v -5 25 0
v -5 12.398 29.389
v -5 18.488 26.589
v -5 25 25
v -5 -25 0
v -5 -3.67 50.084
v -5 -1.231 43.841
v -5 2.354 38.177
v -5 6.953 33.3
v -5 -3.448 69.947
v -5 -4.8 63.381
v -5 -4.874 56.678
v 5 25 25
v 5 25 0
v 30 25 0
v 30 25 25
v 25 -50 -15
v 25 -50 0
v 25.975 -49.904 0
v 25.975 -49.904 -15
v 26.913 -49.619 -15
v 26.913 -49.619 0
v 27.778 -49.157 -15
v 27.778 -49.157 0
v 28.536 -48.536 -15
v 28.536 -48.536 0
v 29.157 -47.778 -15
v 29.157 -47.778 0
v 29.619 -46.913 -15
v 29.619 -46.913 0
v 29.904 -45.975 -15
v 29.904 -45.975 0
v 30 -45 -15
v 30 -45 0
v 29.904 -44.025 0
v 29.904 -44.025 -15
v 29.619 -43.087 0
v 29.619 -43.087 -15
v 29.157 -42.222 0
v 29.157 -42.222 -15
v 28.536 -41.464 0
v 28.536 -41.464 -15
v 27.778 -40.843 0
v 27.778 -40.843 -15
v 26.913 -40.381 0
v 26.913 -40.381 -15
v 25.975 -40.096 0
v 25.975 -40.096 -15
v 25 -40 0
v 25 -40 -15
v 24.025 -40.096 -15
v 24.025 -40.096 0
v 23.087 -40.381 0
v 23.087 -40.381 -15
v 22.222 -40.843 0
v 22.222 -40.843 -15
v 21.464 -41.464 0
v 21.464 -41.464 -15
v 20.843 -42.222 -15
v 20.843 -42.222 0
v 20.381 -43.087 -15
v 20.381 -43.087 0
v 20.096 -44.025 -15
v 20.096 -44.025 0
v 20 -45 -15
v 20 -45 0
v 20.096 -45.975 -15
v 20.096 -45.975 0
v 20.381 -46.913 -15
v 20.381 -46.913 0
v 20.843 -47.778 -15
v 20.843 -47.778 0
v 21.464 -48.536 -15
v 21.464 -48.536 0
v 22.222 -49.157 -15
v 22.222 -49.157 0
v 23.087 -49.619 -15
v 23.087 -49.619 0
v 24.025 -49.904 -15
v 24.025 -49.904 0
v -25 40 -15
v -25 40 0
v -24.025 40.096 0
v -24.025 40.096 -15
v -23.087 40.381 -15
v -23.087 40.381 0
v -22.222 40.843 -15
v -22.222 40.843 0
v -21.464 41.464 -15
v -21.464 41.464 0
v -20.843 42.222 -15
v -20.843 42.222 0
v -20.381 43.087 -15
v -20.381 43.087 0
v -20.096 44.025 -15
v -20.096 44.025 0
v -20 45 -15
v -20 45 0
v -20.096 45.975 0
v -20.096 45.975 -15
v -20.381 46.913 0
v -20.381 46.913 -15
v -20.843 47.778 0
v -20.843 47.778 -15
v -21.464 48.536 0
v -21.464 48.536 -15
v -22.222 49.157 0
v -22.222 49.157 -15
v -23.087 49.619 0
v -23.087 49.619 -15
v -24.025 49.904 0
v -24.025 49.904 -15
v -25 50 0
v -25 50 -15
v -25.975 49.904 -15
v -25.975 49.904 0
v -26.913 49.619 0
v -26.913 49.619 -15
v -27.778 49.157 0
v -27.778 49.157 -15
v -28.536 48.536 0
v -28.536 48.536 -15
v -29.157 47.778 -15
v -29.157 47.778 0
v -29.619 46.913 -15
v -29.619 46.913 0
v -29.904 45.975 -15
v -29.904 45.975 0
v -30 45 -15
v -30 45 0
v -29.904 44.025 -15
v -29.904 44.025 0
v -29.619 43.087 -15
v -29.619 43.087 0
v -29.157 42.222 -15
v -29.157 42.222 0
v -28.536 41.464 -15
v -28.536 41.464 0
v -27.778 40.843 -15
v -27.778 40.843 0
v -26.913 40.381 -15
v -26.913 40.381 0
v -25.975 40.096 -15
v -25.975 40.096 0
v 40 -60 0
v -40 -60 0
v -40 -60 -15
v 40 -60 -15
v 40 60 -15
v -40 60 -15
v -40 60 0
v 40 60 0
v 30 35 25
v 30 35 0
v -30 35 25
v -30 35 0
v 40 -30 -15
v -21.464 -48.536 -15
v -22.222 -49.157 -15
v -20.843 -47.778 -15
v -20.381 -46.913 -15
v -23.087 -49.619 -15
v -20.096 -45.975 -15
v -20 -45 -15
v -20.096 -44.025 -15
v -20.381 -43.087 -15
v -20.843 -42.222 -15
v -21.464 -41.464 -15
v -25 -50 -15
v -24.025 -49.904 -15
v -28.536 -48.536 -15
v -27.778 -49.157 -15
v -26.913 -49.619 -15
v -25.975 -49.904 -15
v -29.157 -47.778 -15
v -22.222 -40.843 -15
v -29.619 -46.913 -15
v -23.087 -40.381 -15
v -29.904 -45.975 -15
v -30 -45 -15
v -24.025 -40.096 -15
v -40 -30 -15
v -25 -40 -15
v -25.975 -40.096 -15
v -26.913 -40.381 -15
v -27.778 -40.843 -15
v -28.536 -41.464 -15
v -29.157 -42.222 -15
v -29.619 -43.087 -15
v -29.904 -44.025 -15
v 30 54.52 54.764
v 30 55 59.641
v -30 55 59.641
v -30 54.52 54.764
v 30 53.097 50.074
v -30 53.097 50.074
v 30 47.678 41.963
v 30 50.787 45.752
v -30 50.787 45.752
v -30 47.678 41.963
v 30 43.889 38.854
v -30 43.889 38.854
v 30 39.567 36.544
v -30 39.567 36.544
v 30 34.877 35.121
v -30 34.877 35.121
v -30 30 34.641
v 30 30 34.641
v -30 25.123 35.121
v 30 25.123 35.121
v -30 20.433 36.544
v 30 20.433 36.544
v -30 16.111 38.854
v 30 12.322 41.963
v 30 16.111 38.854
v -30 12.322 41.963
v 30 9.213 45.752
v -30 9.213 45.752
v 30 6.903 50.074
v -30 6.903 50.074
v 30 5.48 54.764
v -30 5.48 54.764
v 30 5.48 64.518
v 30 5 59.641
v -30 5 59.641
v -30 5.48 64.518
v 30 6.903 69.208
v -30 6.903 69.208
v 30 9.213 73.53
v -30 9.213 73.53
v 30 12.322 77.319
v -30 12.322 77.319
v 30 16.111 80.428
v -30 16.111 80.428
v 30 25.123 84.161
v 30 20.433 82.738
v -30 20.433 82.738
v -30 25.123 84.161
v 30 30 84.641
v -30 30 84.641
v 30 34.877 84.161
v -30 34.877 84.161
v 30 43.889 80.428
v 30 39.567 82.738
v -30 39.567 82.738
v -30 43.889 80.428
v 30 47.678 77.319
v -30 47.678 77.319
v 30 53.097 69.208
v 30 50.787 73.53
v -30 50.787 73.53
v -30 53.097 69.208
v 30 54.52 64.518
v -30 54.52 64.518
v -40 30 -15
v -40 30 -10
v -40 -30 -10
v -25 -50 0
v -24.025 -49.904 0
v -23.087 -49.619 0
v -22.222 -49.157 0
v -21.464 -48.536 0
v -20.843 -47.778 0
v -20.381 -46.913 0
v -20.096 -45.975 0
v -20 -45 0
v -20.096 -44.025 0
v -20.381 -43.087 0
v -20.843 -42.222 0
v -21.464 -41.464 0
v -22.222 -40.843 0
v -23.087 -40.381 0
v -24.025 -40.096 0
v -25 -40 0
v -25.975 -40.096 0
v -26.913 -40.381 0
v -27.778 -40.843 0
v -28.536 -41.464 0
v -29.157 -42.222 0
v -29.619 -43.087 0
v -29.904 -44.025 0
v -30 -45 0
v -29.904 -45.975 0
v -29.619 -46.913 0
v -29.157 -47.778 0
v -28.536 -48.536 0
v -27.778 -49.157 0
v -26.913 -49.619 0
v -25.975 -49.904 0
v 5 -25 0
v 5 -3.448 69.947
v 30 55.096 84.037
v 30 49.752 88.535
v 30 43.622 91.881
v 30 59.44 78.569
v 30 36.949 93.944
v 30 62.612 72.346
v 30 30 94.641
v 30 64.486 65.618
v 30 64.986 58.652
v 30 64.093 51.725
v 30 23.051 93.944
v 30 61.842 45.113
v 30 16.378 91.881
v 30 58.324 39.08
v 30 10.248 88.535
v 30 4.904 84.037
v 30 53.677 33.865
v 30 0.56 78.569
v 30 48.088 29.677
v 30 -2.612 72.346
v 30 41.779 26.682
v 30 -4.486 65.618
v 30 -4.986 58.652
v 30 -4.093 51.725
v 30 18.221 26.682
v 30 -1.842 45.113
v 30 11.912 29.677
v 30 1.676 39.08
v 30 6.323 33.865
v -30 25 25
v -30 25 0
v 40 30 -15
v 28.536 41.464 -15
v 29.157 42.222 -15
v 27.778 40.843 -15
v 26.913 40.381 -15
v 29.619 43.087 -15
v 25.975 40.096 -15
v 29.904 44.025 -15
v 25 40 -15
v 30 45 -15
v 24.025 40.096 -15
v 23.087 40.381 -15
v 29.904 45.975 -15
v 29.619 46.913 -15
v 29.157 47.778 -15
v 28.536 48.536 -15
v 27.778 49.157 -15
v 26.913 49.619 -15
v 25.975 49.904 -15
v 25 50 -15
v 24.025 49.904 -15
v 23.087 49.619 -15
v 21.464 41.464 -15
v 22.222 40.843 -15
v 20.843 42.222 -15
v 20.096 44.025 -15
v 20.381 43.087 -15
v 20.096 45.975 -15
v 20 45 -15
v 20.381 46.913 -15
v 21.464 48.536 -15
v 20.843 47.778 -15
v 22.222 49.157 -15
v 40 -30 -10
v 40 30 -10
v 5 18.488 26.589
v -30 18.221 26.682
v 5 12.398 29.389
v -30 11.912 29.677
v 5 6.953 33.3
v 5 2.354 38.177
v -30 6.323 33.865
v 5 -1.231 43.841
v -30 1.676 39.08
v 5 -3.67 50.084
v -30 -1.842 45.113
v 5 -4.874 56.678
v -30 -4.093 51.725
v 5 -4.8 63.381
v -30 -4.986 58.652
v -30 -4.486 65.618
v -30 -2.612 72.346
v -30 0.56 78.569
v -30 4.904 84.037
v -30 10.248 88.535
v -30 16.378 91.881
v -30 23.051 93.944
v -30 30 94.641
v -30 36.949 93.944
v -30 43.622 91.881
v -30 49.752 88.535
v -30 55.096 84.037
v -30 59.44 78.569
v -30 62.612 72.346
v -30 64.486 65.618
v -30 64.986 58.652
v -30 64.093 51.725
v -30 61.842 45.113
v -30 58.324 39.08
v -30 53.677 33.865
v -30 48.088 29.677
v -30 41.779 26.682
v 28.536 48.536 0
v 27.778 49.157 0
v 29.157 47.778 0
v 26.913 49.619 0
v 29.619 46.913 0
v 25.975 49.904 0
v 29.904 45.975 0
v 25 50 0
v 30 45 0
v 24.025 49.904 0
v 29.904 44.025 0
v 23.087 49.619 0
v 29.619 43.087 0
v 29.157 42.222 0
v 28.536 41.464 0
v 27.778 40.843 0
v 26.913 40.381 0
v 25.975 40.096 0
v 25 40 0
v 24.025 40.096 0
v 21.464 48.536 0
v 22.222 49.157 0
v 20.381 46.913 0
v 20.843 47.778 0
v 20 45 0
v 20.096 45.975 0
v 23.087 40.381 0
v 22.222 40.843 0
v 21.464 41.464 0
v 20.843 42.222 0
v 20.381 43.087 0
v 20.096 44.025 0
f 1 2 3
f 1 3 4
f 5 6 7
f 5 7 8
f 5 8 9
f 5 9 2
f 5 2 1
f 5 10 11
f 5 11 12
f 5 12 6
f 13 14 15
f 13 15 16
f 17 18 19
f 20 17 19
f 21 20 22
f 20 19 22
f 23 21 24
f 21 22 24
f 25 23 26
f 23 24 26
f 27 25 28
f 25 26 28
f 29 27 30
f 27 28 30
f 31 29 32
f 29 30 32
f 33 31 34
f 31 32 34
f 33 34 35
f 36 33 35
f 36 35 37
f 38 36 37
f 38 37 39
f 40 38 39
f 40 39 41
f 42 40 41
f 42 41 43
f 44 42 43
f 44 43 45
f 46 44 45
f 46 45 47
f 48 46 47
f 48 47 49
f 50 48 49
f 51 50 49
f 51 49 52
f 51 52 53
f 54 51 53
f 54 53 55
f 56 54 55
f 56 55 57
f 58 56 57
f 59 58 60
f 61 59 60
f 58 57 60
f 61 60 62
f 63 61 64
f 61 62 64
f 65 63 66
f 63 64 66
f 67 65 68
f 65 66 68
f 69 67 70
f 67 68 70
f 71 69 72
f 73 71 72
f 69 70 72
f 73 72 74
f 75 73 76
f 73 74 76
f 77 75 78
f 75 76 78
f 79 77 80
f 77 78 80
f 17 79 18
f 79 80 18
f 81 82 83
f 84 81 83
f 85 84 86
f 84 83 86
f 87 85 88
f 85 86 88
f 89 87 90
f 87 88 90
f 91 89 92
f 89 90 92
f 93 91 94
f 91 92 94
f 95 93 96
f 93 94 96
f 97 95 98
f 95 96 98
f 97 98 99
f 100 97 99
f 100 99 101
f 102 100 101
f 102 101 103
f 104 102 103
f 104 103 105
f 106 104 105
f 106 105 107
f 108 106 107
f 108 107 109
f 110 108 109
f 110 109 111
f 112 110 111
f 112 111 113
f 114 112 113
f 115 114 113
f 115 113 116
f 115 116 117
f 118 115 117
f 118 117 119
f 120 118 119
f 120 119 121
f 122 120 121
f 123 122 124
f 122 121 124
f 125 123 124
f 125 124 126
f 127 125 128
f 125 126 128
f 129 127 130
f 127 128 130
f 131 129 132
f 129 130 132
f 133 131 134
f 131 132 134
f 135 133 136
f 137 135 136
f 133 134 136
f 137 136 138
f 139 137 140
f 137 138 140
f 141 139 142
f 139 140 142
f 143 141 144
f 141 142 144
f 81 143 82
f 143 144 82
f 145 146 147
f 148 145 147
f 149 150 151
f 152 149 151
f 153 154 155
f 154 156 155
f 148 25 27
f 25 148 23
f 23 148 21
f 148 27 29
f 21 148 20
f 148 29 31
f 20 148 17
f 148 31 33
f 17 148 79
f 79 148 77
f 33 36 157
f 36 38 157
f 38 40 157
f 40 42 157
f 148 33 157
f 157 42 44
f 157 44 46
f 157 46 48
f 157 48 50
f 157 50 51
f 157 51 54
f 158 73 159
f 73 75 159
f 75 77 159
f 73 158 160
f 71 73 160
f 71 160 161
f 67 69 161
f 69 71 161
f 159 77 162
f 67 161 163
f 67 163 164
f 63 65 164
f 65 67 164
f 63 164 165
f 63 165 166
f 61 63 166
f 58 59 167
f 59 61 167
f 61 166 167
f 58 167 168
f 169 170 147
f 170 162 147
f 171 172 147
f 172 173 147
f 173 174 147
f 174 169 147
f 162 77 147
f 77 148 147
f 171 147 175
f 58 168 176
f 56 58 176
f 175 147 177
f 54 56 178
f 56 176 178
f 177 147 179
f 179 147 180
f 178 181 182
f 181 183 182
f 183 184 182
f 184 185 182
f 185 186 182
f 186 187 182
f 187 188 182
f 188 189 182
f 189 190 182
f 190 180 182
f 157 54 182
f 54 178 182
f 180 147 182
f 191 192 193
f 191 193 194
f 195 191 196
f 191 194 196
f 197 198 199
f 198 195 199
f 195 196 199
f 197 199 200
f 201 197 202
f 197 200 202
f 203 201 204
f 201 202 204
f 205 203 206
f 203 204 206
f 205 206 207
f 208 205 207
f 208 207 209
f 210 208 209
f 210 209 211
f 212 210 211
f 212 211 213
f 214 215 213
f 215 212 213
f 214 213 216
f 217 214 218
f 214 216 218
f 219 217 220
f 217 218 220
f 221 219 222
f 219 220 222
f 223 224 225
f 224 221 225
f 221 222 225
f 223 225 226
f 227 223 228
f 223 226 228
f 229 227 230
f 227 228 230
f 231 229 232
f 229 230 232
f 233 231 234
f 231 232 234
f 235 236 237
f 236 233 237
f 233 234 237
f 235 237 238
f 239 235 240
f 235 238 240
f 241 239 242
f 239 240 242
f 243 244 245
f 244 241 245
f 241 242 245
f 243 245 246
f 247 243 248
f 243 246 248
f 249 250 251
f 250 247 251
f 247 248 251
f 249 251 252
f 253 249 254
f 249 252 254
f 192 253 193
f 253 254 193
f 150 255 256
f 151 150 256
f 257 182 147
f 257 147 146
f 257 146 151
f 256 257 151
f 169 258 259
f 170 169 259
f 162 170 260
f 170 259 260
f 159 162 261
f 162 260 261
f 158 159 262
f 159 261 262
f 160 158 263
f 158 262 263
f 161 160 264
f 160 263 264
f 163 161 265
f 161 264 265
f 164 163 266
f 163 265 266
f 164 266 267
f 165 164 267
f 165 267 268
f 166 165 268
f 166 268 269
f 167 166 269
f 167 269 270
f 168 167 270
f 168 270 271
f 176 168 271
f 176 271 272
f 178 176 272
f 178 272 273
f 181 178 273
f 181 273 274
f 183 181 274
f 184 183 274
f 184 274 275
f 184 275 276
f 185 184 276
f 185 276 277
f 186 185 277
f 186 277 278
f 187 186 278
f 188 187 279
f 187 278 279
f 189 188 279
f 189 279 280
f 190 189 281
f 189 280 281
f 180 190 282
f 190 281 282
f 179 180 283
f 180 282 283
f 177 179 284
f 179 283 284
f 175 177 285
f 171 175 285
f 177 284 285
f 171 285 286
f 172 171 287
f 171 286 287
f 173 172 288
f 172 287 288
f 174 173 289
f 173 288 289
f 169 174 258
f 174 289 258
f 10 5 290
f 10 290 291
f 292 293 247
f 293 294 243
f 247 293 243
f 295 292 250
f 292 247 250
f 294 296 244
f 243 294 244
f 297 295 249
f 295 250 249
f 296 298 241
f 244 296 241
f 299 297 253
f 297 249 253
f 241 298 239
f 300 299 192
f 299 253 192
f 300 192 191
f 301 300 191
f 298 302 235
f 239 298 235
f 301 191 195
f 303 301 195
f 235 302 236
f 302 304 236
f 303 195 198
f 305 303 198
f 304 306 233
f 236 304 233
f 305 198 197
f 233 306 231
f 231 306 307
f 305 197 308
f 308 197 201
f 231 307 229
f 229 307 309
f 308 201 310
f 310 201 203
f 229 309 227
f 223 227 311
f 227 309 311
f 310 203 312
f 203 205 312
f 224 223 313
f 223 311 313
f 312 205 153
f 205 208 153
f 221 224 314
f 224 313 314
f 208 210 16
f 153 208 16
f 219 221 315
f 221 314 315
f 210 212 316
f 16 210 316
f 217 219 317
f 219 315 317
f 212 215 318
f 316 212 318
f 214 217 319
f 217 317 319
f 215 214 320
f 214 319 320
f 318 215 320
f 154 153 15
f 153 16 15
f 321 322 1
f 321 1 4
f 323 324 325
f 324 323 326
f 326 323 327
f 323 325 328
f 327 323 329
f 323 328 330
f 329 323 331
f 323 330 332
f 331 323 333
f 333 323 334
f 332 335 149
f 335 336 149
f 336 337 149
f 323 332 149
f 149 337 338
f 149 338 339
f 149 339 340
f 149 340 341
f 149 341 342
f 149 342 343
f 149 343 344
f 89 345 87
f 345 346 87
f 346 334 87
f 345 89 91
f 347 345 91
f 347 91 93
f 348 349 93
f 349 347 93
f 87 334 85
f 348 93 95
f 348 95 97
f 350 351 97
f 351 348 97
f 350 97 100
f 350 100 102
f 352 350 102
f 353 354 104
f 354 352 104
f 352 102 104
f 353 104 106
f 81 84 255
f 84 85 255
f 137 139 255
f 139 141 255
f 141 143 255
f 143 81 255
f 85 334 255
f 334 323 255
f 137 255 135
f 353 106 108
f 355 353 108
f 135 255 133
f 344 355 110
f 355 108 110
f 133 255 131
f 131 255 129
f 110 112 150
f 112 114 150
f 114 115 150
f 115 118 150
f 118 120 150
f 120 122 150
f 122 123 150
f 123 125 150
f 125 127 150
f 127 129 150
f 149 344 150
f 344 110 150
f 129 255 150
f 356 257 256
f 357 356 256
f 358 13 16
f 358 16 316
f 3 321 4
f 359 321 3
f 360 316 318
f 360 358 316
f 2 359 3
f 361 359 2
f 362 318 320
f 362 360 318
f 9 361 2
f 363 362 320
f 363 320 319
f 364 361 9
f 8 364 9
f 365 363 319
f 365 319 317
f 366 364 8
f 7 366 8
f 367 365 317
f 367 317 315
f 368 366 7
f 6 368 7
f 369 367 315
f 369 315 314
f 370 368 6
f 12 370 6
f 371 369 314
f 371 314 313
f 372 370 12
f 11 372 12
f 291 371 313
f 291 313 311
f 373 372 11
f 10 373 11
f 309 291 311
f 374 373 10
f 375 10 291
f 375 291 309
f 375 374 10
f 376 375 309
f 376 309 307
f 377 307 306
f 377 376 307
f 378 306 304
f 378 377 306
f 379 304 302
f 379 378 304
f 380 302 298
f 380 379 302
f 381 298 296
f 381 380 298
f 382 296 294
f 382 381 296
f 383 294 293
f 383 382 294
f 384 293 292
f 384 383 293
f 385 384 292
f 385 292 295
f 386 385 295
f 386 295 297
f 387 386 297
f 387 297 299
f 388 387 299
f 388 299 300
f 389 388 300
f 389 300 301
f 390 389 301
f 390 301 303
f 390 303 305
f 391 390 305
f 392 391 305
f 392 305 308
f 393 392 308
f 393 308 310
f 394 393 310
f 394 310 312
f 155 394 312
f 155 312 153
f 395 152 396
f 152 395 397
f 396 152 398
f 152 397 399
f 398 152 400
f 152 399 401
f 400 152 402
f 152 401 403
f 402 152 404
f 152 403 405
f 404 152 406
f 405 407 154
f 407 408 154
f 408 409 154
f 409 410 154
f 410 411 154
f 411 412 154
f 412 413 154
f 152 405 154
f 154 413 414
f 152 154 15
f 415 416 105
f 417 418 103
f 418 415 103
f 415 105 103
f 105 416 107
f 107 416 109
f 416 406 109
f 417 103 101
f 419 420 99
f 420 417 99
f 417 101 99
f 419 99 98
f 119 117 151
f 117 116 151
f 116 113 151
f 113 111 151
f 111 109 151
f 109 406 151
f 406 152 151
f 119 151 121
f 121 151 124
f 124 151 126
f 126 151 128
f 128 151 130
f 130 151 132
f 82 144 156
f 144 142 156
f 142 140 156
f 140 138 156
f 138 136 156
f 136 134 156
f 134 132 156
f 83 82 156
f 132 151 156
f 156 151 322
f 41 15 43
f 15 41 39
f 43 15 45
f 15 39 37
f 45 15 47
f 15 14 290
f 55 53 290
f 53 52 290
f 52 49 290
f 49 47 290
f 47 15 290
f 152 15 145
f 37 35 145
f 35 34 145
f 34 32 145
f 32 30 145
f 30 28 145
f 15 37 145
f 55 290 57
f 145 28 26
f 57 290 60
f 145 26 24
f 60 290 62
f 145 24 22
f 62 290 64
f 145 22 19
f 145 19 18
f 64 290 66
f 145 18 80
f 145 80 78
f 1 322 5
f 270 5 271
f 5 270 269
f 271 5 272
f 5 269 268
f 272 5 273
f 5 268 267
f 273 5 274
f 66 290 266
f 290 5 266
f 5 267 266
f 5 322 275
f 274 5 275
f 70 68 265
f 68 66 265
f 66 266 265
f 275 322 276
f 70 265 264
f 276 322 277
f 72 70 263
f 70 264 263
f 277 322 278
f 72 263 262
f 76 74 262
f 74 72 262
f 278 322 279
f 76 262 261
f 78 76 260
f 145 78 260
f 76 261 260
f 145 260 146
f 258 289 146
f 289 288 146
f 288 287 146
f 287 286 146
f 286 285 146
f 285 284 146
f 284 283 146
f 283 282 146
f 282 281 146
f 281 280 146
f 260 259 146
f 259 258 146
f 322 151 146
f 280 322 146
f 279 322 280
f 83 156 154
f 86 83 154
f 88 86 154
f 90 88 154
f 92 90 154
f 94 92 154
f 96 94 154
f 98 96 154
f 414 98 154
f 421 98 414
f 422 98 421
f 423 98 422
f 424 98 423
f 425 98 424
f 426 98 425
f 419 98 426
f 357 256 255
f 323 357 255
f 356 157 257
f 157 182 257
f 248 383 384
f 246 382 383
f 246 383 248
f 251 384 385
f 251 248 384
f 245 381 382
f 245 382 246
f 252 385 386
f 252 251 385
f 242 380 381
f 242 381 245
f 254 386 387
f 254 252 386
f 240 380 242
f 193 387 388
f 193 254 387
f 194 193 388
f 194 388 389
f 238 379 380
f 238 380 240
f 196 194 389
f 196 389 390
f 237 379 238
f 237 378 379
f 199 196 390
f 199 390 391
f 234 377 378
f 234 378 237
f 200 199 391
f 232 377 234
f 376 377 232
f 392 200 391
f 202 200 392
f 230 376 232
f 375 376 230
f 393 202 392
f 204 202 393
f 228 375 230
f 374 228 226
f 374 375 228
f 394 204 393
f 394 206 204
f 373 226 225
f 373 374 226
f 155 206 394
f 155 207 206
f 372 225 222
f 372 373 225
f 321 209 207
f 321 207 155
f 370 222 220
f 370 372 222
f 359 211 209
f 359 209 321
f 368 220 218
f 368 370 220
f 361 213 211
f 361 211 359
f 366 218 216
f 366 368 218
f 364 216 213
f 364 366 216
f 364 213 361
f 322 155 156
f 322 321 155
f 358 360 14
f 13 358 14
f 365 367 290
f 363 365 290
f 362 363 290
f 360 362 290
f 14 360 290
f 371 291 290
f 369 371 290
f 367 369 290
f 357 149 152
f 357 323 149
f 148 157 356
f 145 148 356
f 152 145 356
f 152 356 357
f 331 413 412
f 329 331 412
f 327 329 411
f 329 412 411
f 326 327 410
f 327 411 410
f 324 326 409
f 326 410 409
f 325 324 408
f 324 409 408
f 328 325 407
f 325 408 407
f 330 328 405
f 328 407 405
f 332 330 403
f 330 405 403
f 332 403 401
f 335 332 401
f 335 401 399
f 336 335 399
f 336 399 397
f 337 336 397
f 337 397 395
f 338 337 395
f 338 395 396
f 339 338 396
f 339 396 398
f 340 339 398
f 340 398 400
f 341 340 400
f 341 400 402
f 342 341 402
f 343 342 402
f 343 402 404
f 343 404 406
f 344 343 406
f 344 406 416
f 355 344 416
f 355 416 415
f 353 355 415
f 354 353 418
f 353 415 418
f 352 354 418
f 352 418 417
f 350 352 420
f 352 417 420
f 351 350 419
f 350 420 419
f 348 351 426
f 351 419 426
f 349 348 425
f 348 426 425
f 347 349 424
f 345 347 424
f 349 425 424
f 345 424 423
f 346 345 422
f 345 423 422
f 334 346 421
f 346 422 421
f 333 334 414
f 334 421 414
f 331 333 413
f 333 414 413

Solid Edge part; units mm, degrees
sketch "Sketch1" plane through (0, 0, 0) normal (1, 0, 0) x (0, 1, 0)
  line L0 (60, 0) -> (-60, 0)
  line L1 (-60, 0) -> (-60, -15)
  line L2 (-60, -15) -> (-30, -15)
  line L3 (-30, -15) -> (-30, -10)
  line L4 (-30, -10) -> (30, -10)
  line L5 (30, -10) -> (30, -15)
  line L6 (30, -15) -> (60, -15)
  line L7 (60, -15) -> (60, 0)
extrude "Protrusion1" add sketch "Sketch1" along normal mid plane 80
hole "Hole_1" at (-25, -45, 0) direction (0, 0, -1) diameter 10 end up to next
pattern_linear "Pattern1" count 2 spacing 50 along (1, 0, 0) count 2 spacing 90 along (0, 1, 0) of "Hole_1"
sketch "Sketch2" plane through (0, 0, 0) normal (1, 0, 0) x (0, 1, 0)
  arc A0 (25, 25) -> (35, 25) centre (30, 59.641) cw
  line L0 (35, 0) -> (35, 25)
  line L1 (35, 0) -> (25, 0)
  line L2 (25, 0) -> (25, 25)
  circle A1 centre (30, 59.641) radius 25
extrude "ExtrudedProtrusion_4" add sketch "Sketch2" along normal mid plane 60
sketch "Sketch3" plane through (0, 0, 0) normal (1, 0, 0) x (0, 1, 0)
  line L0 (-25, 0) -> (-3.4483, 69.9469)
  arc A0 (-3.4483, 69.9469) -> (25, 25) centre (30, 59.641) ccw
  line L1 (25, 0) -> (25, 25)
  line L2 (25, 0) -> (-25, 0)
extrude "ExtrudedProtrusion_3" add sketch "Sketch3" along normal mid plane 10
